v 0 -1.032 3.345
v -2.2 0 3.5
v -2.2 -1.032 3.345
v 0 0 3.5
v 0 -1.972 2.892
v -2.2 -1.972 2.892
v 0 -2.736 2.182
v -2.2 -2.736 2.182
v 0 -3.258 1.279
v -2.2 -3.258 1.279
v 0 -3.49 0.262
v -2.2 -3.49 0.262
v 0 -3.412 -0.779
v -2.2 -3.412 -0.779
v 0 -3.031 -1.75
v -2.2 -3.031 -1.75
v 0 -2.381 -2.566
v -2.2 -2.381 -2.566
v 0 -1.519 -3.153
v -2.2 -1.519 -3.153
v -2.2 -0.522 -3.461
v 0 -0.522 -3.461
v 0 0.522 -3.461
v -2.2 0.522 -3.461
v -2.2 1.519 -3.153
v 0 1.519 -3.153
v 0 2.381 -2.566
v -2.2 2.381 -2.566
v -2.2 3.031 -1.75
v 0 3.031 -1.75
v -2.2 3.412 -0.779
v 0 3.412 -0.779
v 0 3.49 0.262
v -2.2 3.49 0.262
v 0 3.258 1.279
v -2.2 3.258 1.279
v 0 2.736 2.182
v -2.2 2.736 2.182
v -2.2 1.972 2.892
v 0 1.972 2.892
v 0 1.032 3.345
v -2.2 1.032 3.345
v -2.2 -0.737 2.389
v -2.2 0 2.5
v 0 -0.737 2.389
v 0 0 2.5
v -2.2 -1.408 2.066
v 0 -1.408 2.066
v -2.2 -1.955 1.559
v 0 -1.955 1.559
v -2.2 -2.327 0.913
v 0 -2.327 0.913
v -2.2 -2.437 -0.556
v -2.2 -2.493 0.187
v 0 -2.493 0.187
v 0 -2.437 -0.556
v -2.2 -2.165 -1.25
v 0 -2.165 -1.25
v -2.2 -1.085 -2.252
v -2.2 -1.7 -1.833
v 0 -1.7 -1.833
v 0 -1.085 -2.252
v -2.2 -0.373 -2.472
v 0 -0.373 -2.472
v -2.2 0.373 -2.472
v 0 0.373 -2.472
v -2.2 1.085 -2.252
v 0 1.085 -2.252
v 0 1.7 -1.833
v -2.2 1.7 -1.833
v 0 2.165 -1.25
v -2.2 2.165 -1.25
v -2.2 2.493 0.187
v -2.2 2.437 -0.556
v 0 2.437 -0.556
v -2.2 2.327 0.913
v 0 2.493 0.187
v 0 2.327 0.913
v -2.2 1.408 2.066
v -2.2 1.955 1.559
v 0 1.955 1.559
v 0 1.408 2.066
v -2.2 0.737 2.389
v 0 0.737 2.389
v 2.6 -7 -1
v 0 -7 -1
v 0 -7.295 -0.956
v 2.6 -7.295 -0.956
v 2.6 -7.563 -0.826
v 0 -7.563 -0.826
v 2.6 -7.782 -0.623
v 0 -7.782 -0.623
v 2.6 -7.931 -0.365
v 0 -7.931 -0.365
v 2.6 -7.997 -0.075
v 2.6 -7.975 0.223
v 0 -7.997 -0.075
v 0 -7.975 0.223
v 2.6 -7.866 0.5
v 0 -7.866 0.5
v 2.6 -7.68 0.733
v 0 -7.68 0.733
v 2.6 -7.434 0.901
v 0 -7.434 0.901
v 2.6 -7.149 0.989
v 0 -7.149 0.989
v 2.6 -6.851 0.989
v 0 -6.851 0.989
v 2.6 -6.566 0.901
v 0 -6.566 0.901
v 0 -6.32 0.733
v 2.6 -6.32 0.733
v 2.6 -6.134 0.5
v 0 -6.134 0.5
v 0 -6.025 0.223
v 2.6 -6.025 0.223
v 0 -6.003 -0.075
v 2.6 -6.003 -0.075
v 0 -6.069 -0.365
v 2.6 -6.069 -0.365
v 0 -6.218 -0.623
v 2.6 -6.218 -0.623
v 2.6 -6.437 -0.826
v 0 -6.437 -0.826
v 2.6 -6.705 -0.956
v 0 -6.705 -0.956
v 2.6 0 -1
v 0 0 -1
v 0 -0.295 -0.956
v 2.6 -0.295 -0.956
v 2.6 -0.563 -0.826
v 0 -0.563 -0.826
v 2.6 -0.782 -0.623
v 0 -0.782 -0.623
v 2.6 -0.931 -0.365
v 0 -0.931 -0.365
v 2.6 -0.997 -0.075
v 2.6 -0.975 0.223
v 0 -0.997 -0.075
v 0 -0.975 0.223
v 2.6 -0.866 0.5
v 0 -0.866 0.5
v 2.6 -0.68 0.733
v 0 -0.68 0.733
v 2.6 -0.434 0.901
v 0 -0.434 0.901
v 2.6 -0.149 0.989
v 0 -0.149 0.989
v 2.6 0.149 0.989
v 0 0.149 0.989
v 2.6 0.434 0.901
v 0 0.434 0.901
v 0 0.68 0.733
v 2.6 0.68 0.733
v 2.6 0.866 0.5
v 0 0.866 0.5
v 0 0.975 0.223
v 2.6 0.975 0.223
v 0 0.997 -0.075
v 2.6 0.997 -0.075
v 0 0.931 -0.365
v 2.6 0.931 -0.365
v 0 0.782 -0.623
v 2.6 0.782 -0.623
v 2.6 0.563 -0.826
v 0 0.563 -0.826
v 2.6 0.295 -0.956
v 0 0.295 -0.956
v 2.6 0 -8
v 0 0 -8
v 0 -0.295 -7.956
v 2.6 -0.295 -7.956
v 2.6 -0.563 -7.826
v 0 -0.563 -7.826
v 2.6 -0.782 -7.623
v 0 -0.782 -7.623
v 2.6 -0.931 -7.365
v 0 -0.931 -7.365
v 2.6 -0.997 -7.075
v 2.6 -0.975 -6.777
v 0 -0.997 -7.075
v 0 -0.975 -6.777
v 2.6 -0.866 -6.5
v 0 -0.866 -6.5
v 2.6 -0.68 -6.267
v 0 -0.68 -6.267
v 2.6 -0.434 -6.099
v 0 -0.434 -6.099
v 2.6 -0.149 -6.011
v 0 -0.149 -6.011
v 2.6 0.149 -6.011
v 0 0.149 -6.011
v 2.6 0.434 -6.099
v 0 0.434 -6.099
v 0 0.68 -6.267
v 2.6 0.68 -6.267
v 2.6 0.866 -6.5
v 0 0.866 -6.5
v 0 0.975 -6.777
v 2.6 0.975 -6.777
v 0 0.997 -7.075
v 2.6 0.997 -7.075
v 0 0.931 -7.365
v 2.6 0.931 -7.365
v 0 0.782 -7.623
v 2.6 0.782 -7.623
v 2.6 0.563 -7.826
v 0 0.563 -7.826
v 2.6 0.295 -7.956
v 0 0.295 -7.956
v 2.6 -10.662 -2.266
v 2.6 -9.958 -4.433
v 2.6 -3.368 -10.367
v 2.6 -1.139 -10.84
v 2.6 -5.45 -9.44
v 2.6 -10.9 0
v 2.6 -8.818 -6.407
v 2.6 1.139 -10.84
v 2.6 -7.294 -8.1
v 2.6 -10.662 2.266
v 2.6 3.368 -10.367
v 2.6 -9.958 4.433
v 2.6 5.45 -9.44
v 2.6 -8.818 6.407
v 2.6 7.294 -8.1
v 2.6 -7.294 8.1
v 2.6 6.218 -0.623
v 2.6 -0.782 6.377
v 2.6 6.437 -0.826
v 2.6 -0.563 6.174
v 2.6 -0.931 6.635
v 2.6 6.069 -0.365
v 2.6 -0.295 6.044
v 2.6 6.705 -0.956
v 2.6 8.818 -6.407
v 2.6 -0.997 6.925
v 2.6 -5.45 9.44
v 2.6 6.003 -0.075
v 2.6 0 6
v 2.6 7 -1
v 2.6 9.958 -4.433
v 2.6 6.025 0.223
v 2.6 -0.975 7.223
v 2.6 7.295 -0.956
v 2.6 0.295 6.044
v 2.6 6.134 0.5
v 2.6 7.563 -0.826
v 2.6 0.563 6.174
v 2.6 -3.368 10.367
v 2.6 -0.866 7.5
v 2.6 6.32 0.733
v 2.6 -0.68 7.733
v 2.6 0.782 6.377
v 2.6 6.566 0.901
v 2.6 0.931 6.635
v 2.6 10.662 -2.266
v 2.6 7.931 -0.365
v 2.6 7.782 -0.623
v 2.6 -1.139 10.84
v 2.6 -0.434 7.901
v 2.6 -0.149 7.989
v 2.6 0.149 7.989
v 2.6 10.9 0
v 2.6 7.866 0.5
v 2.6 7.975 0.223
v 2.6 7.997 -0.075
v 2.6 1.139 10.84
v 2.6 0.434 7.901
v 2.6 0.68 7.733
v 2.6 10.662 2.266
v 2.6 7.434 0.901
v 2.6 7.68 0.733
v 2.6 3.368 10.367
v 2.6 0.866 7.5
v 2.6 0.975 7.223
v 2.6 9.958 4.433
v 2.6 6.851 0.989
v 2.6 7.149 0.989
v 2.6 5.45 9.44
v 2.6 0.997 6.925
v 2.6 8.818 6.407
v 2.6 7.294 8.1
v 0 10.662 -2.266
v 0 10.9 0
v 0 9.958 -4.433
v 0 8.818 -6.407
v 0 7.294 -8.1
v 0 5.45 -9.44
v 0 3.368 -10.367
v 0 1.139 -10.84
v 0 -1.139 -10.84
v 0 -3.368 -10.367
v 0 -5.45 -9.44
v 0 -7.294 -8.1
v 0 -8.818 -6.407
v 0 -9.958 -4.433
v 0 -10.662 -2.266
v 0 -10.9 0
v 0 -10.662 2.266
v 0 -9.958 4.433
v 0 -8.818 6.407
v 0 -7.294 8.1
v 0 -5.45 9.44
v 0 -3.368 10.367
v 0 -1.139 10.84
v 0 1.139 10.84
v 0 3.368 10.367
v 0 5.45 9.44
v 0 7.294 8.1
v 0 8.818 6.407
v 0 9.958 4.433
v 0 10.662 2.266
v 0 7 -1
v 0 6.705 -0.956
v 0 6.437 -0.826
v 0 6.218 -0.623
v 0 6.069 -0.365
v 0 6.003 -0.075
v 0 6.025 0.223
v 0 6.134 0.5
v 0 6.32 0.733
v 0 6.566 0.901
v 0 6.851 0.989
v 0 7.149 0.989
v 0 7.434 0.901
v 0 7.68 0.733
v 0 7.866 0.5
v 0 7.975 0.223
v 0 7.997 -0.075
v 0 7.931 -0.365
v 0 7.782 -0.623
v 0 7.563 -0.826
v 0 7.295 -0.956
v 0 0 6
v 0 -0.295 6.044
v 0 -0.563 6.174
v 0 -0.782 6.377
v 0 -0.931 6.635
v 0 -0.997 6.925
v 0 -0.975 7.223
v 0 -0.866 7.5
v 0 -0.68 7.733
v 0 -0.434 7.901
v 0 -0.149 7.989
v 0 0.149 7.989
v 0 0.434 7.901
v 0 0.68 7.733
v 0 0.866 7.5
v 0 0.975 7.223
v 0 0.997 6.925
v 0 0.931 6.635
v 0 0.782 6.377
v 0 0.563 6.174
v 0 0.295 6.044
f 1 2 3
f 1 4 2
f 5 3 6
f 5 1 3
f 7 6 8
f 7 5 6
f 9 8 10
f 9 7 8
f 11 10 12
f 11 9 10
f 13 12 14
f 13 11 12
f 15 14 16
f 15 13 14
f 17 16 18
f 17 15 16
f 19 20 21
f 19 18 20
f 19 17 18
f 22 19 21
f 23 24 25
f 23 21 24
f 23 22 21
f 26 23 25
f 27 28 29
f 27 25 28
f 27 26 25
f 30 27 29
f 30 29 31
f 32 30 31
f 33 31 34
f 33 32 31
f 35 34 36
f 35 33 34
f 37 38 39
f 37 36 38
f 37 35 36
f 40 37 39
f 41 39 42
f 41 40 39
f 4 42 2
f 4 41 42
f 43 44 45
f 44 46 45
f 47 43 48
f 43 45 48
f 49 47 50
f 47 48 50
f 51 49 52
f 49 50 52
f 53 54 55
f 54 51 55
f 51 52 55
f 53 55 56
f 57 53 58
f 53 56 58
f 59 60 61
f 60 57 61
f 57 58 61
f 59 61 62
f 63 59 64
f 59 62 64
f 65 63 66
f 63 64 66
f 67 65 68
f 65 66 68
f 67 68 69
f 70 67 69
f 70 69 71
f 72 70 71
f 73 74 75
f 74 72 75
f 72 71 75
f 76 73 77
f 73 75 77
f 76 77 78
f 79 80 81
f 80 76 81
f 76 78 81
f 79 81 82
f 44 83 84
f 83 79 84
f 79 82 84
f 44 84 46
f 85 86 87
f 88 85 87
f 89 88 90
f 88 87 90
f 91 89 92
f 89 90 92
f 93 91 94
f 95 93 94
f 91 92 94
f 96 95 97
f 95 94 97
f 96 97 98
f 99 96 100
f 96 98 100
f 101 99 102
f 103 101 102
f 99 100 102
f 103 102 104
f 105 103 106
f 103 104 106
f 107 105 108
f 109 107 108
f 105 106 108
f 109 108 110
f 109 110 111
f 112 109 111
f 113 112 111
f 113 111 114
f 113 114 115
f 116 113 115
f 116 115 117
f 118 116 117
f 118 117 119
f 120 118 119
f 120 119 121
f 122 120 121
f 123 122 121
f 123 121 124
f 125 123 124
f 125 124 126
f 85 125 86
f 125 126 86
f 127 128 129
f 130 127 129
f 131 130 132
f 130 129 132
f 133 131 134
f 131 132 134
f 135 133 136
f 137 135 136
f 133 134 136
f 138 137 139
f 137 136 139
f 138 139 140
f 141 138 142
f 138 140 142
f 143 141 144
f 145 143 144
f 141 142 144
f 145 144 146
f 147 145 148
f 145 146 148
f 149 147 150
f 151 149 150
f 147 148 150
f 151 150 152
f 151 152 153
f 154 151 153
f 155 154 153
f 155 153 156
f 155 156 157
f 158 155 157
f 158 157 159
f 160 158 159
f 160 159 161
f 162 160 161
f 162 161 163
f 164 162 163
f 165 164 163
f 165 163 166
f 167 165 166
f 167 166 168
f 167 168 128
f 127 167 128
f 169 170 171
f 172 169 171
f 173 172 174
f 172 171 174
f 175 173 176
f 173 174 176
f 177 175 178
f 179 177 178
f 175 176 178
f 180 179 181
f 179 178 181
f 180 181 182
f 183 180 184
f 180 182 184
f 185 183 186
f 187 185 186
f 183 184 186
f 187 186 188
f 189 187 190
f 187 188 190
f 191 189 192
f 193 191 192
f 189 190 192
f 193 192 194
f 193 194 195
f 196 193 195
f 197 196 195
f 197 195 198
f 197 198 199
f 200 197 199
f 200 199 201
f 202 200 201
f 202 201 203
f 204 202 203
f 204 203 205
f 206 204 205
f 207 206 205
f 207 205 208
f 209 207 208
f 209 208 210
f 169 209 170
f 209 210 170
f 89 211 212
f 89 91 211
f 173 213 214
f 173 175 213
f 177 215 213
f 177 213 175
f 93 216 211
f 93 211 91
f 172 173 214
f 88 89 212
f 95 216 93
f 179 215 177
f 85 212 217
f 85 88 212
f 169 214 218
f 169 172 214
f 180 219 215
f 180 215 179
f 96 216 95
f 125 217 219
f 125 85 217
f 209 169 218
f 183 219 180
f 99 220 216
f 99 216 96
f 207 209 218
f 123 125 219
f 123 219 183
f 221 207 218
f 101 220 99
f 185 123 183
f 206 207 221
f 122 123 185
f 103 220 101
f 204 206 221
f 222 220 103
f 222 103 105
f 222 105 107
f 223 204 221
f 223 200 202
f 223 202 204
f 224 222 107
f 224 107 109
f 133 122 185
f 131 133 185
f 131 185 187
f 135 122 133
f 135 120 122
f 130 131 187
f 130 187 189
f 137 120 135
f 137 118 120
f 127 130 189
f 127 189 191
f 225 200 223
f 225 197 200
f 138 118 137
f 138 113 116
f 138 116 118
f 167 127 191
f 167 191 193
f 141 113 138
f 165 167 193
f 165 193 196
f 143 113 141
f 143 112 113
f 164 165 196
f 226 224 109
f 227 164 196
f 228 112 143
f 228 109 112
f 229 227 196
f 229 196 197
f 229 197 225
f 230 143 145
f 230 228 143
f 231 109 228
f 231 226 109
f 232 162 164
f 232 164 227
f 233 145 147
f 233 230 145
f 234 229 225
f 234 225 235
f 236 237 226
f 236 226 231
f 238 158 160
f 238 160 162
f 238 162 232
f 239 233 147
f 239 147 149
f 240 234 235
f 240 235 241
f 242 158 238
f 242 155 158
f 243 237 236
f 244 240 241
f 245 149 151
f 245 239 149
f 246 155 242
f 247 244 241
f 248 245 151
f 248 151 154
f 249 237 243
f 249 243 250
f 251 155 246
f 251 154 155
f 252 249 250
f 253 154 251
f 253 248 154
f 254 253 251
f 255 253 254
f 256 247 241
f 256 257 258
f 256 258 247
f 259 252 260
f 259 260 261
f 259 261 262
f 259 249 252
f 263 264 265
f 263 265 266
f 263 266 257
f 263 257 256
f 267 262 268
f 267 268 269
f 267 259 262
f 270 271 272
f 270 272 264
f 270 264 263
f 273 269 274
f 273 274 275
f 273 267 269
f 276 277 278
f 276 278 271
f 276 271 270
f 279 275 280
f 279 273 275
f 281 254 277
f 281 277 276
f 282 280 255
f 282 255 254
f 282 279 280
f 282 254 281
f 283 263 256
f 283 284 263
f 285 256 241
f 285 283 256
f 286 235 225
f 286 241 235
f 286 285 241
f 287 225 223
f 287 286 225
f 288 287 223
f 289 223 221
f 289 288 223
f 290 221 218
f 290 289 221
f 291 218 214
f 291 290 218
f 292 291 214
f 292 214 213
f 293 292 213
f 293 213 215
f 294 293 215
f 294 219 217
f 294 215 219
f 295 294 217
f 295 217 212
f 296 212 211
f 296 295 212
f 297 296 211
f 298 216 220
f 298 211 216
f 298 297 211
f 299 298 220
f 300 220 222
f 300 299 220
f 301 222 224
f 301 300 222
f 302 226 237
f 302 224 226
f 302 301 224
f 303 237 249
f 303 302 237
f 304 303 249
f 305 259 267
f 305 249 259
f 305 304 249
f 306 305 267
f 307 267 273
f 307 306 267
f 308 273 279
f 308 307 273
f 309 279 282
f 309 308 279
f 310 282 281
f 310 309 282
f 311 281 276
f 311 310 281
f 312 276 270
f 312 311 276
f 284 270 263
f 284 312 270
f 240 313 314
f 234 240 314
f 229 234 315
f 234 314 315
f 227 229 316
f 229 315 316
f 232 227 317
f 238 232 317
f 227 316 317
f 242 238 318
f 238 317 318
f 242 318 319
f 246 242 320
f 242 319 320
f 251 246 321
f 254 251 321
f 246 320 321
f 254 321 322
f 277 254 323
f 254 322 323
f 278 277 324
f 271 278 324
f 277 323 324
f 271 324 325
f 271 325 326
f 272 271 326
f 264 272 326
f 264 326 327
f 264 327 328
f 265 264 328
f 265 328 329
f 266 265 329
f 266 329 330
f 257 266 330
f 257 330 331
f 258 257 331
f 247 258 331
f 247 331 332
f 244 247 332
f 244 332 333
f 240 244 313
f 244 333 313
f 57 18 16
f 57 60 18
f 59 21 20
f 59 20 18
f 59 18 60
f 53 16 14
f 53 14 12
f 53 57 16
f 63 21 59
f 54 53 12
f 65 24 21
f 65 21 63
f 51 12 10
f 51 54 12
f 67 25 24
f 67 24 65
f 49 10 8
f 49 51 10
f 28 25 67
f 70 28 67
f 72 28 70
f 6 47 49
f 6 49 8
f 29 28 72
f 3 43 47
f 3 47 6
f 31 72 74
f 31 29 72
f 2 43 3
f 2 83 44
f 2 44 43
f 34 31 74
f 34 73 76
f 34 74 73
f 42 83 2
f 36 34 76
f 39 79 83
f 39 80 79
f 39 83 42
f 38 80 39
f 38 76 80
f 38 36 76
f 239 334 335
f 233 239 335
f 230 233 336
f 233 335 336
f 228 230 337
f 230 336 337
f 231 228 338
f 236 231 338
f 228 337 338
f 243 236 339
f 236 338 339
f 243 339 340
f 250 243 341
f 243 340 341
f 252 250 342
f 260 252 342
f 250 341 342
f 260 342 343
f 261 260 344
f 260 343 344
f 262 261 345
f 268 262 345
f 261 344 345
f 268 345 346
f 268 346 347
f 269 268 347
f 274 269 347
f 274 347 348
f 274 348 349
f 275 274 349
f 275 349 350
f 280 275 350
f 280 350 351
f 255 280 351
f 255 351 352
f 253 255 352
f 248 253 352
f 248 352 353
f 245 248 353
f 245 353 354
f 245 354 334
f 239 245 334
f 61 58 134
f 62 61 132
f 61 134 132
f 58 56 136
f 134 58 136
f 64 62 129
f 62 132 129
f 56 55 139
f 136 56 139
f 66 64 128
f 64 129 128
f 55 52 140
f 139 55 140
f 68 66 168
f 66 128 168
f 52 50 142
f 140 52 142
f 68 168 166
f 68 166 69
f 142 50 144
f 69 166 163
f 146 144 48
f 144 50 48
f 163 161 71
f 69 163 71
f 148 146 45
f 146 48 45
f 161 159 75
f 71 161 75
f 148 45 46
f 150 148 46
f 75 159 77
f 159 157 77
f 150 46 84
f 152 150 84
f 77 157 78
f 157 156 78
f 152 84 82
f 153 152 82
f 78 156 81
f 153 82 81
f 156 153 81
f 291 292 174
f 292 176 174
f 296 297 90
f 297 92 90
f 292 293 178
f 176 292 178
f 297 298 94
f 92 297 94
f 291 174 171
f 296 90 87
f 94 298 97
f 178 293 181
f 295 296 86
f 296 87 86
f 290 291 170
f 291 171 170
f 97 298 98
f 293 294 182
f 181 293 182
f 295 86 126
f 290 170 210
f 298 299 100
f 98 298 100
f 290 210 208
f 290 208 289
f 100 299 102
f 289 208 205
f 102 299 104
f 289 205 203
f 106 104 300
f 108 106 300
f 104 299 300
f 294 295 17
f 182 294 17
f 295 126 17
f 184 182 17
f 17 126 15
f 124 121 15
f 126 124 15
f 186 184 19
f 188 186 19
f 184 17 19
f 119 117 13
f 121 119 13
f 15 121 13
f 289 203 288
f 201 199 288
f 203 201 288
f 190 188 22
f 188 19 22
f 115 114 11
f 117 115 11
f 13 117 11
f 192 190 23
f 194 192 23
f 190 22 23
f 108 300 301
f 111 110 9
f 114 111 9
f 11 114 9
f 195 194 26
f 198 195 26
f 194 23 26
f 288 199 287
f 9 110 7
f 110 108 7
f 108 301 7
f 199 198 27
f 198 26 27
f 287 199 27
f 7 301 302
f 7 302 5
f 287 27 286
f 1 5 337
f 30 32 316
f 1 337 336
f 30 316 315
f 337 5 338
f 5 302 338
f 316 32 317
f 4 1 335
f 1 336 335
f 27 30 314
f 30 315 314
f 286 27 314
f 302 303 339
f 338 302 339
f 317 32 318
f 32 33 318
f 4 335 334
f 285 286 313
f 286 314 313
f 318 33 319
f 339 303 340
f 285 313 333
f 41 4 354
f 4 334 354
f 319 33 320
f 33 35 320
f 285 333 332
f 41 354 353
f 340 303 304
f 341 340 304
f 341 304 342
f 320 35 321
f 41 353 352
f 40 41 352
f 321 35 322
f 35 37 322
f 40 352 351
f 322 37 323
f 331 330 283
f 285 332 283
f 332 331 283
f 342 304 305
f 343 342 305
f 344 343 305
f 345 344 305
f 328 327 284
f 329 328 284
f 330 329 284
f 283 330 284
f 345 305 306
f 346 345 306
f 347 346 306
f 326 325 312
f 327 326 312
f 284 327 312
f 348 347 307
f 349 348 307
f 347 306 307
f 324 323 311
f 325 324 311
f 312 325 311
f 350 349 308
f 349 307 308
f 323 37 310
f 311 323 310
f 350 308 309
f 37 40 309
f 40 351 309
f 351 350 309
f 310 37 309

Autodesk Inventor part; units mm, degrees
ref_plane "YZ Plane" through (0, 0, 0) normal (1, 0, 0) x (0, 1, 0)
ref_plane "XZ Plane" through (0, 0, 0) normal (0, 1, 0) x (-1, 0, 0)
ref_plane "XY Plane" through (0, 0, 0) normal (0, 0, 1) x (1, 0, 0)
sketch "Sketch1" plane through (0, 0, 0) normal (1, 0, 0) x (0, 1, 0)
  circle A0 centre (0, 0) radius 10.9
  dimension "d0" = 21.8
extrude "Extrusion1" add sketch "Sketch1" along normal blind 2.6
sketch "Sketch2" plane through (0, 0, 0) normal (-1, 0, 0) x (0, 0, 1)
  circle A0 centre (0, 0) radius 2.5
  circle A1 centre (0, 0) radius 3.5
  dimension "d3" = 5
  dimension "d4" = 7
extrude "Extrusion2" add sketch "Sketch2" along normal blind 2.2
sketch "Sketch3" plane through (2.6, 0, 0) normal (1, 0, 0) x (0, 0, -1)
  circle A0 centre (0, 0) radius 1
  dimension "d7" = 2
hole "Hole1" at (2.6, 0, 0) direction (-1, 0, 0) diameter 2 depth 2
thread "Thread1" size "M2x0.4" class "6H" standard "ANSI Metric M Profile" length 5
sketch "Sketch4" plane through (2.6, 0, 0) normal (1, 0, 0) x (0, 0, -1)
  circle A0 centre (0, 0) radius 1 projected
  circle A1 centre (0, 0) radius 7
  circle A2 centre (-7, 0) radius 1
  circle A3 centre (0, -7) radius 1
  circle A4 centre (7, 0) radius 1
  circle A5 centre (0, 7) radius 1
  dimension "d17" = 14
  dimension "d18" = 2
  dimension "d21" = 360
hole "Hole2" at (2.6, -7, 0) at (2.6, 0, 7) at (2.6, 7, 0) at (2.6, 0, -7) at (2.6, 0, 0) direction (-1, 0, 0) diameter 2 depth 3
thread "Thread2" size "M2x0.4" class "6H" standard "ANSI Metric M Profile" length 4
thread "Thread3" size "M2x0.4" class "6H" standard "ANSI Metric M Profile" length 4
thread "Thread4" size "M2x0.4" class "6H" standard "ANSI Metric M Profile" length 4
thread "Thread5" size "M2x0.4" class "6H" standard "ANSI Metric M Profile" length 4
properties part number "Part L"
